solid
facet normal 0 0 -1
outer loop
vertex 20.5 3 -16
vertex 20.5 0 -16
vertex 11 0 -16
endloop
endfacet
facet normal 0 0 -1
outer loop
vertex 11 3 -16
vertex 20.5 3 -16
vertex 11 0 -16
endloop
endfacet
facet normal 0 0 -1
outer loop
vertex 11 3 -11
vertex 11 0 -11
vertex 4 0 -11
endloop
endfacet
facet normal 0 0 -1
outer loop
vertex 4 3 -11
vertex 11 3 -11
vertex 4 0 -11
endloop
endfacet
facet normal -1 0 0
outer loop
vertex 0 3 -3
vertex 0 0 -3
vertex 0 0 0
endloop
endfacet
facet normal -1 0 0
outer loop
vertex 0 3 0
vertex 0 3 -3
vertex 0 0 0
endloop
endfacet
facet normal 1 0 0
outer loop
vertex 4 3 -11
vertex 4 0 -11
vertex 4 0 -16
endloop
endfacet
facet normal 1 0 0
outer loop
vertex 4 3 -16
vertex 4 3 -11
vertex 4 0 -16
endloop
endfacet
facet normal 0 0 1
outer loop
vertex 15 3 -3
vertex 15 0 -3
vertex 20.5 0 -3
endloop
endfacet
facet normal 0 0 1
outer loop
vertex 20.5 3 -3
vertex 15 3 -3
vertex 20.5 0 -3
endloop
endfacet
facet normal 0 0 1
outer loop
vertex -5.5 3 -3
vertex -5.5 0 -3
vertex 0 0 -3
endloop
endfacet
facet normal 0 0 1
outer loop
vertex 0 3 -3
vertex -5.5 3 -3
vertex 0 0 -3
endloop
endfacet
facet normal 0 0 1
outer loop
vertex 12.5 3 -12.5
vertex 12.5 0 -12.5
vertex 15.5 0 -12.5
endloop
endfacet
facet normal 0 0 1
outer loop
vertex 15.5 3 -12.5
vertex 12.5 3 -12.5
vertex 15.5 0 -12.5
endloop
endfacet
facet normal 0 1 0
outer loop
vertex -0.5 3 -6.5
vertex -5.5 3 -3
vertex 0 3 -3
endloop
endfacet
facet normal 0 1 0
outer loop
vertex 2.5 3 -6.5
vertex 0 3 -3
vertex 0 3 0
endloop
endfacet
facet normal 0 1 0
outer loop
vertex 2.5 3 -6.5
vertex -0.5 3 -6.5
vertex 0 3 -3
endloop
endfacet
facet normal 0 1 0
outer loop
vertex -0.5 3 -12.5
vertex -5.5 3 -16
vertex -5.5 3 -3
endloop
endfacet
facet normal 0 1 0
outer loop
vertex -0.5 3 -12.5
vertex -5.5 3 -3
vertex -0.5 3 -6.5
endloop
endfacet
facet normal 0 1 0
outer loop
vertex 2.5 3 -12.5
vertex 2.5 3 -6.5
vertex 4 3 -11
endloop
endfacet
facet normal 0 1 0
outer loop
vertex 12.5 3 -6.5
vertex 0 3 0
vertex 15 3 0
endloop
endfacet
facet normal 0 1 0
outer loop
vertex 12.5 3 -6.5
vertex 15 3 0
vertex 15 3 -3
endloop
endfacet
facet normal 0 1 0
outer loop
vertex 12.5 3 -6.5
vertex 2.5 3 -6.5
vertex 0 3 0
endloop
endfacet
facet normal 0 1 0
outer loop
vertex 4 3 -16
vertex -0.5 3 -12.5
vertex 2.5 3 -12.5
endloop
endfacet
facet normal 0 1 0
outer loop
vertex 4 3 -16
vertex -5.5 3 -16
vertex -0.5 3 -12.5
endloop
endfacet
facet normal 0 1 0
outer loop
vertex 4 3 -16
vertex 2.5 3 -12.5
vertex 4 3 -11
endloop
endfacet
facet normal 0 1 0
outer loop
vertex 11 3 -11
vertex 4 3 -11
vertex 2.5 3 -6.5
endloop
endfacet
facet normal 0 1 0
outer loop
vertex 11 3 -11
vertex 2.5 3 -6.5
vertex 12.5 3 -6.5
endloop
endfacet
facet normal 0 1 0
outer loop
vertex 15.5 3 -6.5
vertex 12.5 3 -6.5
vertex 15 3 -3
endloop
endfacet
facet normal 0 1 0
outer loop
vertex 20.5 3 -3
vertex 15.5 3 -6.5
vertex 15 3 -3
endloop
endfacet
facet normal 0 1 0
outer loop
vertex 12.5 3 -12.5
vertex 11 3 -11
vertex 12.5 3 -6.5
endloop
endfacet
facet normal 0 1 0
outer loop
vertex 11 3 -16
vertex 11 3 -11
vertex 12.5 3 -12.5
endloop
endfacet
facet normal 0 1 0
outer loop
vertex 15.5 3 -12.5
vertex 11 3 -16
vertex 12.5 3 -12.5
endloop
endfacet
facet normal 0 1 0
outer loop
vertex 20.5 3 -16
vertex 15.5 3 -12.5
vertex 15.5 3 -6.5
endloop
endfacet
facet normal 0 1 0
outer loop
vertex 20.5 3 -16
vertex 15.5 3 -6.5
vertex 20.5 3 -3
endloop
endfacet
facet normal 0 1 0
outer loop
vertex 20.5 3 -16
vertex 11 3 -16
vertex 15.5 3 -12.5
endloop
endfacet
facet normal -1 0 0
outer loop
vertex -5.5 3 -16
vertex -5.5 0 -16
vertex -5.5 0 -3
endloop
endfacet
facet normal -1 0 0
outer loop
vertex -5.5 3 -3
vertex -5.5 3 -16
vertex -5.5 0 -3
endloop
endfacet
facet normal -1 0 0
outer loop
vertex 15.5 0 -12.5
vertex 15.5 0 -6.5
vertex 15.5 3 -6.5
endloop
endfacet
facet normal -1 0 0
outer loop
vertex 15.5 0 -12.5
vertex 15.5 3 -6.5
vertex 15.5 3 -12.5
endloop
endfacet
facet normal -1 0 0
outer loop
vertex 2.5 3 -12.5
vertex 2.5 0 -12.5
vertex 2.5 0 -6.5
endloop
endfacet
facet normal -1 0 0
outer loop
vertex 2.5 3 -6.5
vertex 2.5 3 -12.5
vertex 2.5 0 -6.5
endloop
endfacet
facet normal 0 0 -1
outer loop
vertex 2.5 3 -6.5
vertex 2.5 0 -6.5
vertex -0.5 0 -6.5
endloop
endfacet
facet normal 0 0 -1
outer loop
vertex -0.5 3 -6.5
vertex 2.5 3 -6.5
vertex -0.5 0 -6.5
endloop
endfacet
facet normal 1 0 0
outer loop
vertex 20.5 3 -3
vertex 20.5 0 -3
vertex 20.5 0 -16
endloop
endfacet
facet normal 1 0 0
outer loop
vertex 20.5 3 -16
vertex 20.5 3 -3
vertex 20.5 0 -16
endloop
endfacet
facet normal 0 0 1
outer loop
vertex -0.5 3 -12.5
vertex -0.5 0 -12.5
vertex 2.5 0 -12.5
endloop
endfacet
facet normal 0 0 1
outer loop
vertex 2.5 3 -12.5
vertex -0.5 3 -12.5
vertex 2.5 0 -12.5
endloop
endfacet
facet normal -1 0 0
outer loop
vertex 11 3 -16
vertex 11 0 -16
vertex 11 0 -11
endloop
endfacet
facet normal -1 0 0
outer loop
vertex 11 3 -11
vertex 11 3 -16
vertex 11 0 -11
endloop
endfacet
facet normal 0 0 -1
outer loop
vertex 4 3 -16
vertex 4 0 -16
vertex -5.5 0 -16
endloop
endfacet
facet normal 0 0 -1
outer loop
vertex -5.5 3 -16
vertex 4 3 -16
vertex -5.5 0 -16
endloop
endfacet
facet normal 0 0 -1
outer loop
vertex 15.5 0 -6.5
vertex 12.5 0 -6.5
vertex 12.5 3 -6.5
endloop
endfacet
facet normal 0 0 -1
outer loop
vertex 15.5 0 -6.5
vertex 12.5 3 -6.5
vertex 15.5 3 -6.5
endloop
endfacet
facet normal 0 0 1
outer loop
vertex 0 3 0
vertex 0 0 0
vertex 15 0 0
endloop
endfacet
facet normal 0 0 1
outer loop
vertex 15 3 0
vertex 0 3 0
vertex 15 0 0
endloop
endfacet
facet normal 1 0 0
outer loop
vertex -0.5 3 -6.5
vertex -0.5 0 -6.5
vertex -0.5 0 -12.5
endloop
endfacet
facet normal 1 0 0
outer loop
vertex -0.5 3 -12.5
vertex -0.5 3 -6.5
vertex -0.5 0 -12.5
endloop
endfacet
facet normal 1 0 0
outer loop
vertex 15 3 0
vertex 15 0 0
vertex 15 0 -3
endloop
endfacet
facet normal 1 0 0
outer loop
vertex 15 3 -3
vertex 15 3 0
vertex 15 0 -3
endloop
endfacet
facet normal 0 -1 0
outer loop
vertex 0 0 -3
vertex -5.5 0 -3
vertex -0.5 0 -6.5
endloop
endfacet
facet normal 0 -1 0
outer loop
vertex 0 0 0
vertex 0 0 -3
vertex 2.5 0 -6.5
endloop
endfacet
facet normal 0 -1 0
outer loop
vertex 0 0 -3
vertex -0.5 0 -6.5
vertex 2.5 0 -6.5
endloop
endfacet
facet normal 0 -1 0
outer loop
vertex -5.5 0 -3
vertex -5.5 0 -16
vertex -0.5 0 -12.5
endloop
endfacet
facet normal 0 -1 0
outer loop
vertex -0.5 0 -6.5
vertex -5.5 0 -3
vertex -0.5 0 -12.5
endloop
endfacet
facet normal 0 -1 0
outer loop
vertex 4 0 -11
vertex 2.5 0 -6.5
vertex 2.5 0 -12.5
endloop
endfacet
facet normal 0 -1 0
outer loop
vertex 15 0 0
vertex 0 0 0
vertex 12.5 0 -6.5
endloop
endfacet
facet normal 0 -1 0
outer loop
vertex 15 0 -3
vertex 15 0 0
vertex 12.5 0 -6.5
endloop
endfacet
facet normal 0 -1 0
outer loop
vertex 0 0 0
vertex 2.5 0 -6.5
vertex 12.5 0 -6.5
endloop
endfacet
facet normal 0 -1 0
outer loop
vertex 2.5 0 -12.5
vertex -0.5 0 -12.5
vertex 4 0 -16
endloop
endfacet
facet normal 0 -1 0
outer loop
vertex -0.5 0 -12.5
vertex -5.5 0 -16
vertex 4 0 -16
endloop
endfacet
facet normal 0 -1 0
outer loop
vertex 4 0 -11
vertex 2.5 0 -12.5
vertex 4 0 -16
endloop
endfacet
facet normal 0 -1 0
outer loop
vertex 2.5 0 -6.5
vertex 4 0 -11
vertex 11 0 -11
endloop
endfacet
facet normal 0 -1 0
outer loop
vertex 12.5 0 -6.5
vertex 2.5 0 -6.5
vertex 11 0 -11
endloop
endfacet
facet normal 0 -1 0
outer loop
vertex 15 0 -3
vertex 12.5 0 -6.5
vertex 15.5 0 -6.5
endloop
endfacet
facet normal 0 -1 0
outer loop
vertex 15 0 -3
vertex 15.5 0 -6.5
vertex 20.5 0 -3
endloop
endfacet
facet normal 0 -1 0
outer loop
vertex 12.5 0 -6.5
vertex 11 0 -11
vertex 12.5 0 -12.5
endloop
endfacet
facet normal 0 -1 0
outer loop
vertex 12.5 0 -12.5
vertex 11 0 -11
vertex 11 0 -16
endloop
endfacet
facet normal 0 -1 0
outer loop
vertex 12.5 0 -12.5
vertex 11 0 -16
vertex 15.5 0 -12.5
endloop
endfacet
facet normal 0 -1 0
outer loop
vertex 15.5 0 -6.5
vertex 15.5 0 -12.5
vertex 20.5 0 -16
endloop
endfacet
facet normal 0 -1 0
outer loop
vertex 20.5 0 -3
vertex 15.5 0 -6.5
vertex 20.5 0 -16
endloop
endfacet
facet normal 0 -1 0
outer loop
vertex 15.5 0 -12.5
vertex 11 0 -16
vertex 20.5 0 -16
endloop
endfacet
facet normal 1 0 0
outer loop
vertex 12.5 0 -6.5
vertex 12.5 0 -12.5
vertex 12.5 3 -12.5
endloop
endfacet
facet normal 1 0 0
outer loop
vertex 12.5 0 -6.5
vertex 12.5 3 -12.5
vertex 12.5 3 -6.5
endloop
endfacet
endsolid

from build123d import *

# Parameters (mm, degrees)
SALIENTE_EXTRUIR1_DEPTH = 3


with BuildPart() as part:
    # Croquis1 → Saliente-Extruir1 (new body)
    with BuildSketch(Plane(origin=(0, 0, 0), x_dir=(1, 0, 0), z_dir=(0, 1, 0))):
        Polygon((0, 0), (15, 0), (15, 3), (20.5, 3), (20.5, 16), (11, 16), (11, 11), (7.5, 11), (4, 11), (4, 16), (-5.5, 16), (-5.5, 3), (0, 3), align=None)
        Polygon((1, 12.5), (2.5, 12.5), (2.5, 6.5), (-0.5, 6.5), (-0.5, 12.5), align=None, mode=Mode.SUBTRACT)
        Polygon((12.5, 6.5), (15.5, 6.5), (15.5, 12.5), (14, 12.5), (12.5, 12.5), align=None, mode=Mode.SUBTRACT)
    extrude(amount=SALIENTE_EXTRUIR1_DEPTH)


solid = part.part
